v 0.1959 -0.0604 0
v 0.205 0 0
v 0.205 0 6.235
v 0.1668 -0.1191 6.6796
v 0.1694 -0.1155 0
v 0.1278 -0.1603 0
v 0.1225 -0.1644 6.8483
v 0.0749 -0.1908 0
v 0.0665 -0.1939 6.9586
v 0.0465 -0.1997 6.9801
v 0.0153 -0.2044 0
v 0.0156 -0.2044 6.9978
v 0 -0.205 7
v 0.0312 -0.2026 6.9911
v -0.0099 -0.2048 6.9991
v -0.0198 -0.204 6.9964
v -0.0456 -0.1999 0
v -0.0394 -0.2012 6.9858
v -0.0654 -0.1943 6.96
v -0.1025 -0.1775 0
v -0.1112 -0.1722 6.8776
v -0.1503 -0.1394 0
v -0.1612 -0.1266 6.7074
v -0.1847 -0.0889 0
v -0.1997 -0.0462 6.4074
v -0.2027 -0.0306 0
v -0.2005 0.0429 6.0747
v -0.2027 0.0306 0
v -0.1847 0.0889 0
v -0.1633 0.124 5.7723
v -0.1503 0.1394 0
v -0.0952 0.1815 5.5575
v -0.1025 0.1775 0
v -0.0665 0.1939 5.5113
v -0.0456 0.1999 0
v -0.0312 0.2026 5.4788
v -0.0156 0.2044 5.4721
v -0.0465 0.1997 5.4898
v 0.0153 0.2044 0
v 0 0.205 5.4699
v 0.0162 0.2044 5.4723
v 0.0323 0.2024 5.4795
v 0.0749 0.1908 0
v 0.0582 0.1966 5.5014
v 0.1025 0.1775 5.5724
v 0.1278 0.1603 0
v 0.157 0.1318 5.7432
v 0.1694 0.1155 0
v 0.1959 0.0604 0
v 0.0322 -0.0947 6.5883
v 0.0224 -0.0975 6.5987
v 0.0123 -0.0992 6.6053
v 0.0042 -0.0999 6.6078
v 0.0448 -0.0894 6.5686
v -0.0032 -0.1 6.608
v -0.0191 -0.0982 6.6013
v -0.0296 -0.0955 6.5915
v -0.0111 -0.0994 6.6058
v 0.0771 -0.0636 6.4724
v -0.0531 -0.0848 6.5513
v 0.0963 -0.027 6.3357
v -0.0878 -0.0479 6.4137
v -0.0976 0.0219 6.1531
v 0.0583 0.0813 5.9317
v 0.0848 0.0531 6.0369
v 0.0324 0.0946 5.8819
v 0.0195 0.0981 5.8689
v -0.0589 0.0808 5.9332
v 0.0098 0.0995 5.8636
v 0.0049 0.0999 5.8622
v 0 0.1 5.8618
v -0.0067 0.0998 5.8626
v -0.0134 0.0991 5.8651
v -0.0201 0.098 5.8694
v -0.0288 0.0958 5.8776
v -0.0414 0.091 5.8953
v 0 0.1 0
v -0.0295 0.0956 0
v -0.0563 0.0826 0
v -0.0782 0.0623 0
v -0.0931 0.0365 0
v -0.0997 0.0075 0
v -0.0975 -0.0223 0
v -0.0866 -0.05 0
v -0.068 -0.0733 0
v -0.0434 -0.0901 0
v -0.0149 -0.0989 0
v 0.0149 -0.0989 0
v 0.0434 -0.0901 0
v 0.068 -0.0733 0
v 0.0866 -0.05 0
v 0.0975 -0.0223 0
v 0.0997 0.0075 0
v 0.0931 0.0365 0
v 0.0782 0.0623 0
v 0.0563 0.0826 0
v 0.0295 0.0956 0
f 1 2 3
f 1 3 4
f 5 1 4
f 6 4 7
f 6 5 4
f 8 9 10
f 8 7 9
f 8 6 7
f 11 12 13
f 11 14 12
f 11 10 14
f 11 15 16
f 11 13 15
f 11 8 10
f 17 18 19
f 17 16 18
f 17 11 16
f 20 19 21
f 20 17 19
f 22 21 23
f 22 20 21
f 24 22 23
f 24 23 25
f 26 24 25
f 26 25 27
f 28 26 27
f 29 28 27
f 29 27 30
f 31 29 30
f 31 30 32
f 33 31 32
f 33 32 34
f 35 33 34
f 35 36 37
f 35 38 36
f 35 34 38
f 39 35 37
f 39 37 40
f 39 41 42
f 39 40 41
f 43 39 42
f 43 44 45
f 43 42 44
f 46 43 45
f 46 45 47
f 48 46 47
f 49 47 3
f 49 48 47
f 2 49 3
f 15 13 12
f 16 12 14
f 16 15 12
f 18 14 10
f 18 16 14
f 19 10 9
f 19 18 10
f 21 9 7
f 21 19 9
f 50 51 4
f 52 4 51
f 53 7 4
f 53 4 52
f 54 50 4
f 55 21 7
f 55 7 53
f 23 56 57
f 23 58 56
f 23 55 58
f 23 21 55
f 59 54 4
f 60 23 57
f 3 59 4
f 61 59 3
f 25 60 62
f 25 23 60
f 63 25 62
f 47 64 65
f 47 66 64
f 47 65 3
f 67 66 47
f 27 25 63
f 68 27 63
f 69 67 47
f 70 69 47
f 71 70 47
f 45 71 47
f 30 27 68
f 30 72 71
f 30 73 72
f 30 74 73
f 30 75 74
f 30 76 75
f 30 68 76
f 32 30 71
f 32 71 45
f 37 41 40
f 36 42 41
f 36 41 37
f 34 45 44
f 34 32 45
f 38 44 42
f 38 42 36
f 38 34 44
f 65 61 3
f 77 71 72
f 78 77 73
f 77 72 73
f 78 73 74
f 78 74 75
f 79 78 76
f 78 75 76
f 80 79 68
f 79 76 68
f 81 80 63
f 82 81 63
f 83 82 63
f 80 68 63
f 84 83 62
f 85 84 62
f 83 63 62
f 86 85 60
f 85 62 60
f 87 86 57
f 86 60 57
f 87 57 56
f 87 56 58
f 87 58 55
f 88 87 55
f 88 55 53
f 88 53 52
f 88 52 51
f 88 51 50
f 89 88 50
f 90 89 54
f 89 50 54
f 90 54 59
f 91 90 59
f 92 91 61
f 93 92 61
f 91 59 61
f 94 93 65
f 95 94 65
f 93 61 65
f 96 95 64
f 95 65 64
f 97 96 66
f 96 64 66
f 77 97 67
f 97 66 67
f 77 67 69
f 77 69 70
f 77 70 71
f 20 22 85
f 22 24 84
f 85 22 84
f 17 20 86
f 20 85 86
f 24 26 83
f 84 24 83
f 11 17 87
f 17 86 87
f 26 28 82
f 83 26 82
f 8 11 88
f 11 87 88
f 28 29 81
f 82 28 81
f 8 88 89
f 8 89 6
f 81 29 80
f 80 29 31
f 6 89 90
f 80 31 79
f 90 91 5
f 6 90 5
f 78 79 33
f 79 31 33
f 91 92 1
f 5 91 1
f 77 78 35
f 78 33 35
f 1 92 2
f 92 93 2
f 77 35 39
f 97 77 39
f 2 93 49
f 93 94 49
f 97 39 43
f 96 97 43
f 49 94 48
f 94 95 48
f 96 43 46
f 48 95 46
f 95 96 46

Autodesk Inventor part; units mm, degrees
ref_plane "YZ Plane" through (0, 0, 0) normal (1, 0, 0) x (0, 1, 0)
ref_plane "XZ Plane" through (0, 0, 0) normal (0, 1, 0) x (-1, 0, 0)
sketch "Sketch1" plane through (0, 0, 0) normal (0, 0, 1) x (1, 0, 0)
  circle A0 centre (0, 0) radius 0.205
  dimension "d0" = 0.41
extrude "Extrusion5" add sketch "Sketch1" along normal blind 7
hole "Hole2" at (0, 0, 0) direction (0, 0, 1) diameter 0.2 end through all
sketch "Sketch10" plane through (0, 0, 0) normal (1, 0, 0) x (0, 1, 0)
  line L0 (0, -1.6) -> (0, 9.6) projected
  line L1 (-0.205, 7) -> (0.205, 7) projected
  line L2 (0.205, 0) -> (0.205, 7) projected
  line L3 (-0.205, 7) -> (0.205, 5.4699)
  line L4 (0.205, 7) -> (-0.205, 7)
  line L5 (0.205, 5.4699) -> (0.205, 7)
  point P0 (0, 0)
  dimension "d52" = 15
  dimension "d53" = 1.5301
extrude "Extrusion6" cut sketch "Sketch10" along normal through all both and the other way through all
ref_plane "Work Plane1" through (0, -0.205, 7) normal (0, 0, -1) x (-1, 0, 0)
properties part number "Short_Needle"
